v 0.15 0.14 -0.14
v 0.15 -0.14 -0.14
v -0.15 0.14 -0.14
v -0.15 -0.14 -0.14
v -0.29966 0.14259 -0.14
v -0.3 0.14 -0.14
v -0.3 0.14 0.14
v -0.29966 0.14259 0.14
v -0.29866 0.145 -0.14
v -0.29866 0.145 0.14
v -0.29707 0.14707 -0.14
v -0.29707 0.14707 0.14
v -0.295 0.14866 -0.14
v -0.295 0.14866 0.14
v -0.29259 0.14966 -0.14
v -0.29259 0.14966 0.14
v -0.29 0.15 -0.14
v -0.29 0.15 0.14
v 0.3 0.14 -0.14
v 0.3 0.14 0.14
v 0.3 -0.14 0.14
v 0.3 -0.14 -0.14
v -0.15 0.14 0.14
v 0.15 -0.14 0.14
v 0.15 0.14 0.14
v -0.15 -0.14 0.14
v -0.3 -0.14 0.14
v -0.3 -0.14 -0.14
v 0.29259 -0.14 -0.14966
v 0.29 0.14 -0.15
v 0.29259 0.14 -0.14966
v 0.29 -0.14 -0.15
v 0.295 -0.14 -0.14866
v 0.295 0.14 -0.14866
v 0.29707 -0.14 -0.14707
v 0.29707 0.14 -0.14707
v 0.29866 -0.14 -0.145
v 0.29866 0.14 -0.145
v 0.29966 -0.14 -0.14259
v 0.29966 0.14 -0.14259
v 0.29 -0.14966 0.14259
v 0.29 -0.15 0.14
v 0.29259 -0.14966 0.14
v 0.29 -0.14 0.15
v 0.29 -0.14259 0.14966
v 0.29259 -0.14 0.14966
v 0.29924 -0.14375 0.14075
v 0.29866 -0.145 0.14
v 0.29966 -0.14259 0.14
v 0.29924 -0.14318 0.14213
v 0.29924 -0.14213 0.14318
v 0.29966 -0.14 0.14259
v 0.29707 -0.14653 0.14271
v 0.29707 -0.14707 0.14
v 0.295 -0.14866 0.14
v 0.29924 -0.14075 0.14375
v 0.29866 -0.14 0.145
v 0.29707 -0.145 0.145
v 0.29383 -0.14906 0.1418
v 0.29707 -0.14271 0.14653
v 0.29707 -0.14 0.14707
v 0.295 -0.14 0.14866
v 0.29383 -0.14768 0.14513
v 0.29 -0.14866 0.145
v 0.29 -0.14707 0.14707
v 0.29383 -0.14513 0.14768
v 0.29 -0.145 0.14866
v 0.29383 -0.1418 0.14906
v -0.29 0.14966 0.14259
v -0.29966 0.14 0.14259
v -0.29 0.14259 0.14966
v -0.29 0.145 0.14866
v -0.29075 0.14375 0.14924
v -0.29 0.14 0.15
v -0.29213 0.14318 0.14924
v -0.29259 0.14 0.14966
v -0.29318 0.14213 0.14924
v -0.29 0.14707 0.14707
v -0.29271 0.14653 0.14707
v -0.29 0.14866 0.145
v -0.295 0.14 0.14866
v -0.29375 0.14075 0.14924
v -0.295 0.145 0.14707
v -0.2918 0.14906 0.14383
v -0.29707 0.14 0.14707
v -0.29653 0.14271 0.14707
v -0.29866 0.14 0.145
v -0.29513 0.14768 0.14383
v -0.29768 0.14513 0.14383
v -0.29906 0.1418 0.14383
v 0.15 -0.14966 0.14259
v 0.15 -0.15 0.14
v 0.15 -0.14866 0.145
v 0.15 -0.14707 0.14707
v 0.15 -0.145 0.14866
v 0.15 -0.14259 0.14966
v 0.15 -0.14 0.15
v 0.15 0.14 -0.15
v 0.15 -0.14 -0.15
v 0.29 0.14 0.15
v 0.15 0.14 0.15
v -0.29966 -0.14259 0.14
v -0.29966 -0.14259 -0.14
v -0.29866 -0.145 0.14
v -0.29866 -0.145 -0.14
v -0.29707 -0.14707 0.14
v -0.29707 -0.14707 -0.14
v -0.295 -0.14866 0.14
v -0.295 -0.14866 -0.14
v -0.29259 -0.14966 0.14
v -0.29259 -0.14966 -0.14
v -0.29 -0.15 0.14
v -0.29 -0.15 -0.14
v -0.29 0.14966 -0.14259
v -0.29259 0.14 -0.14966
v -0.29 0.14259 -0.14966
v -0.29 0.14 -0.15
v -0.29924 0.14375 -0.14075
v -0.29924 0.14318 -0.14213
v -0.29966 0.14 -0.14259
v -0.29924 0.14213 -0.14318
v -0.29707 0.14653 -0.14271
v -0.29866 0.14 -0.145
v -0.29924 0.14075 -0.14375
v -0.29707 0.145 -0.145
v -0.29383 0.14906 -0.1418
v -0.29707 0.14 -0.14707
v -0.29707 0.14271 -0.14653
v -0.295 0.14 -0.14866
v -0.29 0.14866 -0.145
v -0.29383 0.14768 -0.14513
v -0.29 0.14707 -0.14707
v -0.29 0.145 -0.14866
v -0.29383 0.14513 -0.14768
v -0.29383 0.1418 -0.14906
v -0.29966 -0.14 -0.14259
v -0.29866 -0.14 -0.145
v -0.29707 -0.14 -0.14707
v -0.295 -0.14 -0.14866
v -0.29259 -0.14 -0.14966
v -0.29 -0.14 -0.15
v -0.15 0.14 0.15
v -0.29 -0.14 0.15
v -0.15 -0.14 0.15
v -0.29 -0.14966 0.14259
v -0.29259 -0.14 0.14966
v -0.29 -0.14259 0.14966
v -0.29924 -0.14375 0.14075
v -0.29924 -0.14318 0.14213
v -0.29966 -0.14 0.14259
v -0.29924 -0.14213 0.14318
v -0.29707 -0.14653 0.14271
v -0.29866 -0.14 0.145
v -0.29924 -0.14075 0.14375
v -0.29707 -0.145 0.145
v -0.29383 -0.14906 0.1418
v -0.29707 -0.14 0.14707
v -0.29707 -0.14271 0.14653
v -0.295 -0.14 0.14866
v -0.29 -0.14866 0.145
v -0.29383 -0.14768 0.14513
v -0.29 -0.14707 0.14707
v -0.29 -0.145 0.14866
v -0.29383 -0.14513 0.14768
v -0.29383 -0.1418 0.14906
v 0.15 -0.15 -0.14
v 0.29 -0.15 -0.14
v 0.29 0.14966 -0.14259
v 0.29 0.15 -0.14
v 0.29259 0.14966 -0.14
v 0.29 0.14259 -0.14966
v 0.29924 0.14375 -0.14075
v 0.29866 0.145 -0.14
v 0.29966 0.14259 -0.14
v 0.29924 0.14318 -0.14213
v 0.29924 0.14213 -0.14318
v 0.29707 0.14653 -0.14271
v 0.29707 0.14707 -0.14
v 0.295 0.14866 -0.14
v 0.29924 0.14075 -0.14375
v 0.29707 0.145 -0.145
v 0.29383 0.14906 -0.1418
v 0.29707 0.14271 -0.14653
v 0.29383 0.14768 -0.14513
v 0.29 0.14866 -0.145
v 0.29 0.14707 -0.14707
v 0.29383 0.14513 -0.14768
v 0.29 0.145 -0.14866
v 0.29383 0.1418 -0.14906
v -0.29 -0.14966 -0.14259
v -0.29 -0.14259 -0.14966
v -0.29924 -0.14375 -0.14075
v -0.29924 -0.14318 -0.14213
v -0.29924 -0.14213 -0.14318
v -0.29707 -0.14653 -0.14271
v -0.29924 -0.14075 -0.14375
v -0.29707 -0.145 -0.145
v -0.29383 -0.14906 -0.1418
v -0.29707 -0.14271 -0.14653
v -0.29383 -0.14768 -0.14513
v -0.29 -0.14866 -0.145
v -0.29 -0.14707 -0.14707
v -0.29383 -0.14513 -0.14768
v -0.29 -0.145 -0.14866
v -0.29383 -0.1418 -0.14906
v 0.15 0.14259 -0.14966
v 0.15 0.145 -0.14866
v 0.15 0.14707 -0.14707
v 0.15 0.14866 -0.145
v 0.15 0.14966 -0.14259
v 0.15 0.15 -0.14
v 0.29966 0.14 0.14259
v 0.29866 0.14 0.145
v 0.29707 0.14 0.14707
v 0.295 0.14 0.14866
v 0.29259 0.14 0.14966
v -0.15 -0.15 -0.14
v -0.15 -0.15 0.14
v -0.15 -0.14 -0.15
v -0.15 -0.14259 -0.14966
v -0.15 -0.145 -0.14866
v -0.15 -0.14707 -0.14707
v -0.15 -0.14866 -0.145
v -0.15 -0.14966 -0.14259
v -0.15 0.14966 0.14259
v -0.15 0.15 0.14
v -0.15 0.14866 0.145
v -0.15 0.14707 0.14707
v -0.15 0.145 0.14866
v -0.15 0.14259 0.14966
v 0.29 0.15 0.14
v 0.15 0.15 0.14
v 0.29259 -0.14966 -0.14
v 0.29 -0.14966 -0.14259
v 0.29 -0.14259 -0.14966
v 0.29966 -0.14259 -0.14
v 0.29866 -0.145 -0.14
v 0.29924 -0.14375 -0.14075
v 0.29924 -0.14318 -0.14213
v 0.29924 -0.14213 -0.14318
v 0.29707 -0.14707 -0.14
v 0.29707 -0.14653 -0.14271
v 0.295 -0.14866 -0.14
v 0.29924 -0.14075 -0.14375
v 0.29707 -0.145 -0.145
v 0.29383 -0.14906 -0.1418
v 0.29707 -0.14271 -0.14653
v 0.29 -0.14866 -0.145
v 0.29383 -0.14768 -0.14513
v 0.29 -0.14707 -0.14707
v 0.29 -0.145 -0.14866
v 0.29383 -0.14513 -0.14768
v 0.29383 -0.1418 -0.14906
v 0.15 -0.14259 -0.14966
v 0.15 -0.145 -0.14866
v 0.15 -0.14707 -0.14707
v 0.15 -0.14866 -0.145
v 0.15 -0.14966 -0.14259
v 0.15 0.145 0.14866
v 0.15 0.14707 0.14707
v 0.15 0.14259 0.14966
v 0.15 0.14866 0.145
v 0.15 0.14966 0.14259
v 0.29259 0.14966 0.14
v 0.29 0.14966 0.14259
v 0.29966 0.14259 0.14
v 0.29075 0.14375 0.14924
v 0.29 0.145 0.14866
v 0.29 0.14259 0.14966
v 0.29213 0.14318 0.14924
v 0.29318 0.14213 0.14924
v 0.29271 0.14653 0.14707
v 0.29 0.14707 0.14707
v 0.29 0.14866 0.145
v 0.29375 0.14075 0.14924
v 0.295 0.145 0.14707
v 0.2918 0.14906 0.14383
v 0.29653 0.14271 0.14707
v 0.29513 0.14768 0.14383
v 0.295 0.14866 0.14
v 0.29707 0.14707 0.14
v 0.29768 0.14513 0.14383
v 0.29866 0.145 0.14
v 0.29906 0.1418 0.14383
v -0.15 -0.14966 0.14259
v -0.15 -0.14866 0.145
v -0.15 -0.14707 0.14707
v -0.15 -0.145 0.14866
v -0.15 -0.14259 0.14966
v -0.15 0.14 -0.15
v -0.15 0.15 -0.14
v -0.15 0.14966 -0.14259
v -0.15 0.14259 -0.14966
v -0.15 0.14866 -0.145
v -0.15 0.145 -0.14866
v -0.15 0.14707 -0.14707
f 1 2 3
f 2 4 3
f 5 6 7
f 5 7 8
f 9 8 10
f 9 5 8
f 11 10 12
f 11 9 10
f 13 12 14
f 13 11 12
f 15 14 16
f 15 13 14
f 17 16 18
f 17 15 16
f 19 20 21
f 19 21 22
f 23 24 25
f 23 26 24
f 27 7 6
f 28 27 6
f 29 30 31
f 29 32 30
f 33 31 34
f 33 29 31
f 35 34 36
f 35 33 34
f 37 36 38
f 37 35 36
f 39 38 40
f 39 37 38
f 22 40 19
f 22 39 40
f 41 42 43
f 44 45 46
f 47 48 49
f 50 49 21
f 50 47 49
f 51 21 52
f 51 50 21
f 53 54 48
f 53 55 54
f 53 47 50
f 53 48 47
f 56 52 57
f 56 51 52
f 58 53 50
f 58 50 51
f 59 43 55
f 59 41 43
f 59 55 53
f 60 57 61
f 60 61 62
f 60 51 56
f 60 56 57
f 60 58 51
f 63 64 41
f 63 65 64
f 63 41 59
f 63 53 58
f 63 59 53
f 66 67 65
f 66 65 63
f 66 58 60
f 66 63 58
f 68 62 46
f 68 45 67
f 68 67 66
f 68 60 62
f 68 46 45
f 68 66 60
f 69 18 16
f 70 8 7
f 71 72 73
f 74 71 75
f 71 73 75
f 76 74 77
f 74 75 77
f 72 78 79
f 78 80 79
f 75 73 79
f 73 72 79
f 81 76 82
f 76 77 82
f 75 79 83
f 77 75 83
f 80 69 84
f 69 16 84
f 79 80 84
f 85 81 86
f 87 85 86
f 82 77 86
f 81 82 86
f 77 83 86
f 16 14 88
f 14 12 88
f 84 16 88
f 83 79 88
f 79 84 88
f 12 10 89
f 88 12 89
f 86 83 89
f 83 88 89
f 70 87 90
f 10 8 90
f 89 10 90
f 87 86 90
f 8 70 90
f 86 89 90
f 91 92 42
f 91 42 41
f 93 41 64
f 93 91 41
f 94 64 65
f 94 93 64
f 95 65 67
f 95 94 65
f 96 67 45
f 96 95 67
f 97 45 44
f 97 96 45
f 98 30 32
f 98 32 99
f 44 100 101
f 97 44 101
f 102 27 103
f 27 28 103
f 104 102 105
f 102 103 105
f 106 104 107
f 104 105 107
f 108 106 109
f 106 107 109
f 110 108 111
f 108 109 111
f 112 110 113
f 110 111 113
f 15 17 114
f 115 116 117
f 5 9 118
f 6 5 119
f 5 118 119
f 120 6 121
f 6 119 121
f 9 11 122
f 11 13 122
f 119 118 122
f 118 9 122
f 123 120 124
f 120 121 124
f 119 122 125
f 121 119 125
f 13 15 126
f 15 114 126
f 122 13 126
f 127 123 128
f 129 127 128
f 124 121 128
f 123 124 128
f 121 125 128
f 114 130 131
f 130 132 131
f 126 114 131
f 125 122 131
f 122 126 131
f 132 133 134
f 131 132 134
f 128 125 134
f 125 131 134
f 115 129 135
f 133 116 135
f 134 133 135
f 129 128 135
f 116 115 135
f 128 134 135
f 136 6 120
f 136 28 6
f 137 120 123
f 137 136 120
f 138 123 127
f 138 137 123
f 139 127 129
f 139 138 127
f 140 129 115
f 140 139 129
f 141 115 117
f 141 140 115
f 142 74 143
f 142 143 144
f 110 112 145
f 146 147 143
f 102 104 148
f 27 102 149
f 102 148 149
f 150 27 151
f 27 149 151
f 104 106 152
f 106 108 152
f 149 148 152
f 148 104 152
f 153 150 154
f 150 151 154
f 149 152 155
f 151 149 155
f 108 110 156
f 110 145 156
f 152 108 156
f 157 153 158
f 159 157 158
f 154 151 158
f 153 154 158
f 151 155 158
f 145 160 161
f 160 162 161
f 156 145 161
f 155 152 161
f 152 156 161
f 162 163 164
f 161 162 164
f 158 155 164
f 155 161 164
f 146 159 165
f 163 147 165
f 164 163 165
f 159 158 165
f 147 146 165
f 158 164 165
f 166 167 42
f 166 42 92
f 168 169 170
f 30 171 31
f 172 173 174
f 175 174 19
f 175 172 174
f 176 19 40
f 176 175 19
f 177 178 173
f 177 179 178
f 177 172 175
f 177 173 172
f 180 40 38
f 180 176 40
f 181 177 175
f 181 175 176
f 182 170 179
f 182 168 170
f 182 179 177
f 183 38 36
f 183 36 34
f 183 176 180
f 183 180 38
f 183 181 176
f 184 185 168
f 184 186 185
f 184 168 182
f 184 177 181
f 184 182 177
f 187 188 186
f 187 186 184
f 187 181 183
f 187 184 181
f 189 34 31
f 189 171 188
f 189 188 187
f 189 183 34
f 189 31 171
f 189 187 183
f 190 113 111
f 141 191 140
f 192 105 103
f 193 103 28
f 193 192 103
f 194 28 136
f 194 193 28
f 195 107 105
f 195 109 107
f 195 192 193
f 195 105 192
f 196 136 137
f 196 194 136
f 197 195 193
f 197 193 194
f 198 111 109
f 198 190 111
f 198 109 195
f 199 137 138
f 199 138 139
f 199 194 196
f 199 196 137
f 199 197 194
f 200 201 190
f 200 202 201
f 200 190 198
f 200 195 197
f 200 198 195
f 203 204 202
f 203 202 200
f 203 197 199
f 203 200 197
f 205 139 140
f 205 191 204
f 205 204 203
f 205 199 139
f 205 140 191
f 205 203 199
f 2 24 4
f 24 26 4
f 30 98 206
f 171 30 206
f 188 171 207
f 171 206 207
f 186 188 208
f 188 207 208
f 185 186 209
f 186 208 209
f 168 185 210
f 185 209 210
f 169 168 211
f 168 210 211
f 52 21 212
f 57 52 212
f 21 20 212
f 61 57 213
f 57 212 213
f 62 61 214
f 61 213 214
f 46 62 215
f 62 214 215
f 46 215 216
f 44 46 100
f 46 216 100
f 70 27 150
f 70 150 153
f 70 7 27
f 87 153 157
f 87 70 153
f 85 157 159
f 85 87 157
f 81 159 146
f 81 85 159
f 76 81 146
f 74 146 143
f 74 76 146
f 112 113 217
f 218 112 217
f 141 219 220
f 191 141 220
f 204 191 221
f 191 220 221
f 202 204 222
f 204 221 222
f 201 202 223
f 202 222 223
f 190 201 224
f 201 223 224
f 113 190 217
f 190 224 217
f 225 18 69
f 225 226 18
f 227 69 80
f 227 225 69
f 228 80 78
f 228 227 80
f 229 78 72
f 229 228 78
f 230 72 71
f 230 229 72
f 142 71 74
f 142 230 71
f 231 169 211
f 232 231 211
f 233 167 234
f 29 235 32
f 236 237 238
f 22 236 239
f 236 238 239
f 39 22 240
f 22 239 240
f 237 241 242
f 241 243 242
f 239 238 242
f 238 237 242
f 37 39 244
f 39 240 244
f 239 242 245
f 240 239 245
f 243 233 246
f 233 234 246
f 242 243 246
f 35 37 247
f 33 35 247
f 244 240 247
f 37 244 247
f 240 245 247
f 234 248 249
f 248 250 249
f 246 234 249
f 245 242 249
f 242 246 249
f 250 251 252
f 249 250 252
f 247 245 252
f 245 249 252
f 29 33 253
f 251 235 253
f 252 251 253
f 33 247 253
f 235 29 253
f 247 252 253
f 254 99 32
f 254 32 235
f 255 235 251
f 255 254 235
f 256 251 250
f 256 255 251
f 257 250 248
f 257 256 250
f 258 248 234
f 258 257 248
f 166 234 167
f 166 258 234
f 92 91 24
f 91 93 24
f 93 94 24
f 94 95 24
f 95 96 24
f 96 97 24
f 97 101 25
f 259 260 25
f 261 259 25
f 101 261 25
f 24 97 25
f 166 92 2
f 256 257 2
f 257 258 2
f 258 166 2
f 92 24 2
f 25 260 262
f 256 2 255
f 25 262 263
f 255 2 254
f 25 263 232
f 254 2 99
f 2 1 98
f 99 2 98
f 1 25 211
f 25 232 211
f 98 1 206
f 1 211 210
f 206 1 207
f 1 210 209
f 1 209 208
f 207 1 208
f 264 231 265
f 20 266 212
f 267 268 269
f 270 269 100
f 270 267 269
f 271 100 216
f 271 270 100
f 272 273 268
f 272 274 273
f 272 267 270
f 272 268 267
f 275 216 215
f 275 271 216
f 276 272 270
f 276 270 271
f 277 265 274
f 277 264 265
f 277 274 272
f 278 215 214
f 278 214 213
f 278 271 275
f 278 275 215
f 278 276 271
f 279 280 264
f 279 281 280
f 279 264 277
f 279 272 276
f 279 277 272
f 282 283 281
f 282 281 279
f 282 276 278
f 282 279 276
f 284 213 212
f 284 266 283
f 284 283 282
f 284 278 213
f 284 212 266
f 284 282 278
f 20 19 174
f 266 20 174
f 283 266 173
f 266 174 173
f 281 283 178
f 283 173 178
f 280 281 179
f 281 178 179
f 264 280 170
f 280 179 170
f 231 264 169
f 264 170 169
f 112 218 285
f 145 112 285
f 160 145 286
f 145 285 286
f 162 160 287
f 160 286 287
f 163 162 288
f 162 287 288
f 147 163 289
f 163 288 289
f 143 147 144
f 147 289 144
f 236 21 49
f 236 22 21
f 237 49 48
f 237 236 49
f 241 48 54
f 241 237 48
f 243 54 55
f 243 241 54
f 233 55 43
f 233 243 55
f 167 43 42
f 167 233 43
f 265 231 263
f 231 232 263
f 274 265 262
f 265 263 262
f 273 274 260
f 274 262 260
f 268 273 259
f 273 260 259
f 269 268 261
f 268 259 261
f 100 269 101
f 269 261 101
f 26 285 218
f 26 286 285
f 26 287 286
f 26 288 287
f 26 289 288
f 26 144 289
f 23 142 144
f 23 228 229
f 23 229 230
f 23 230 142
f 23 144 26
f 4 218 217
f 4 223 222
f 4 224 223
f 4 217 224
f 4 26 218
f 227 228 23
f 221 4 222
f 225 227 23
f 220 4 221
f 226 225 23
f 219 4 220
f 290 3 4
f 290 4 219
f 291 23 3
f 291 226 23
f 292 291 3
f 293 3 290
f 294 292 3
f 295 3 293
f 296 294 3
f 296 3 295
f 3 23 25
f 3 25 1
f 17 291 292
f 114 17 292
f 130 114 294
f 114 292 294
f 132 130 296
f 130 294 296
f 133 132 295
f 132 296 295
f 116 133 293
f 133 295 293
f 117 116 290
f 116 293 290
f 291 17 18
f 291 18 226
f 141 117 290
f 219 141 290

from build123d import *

# Parameters (mm, degrees)
SKETCH1_W            = 0.15
SKETCH1_H            = 0.3
THICKNESS_DEPTH      = 0.15
FILLET1_R            = 0.01
SKETCH2_W            = 0.28
SKETCH2_H            = 0.28
BOSS_EXTRUDE2_DEPTH  = 0.15
FILLET1_OF_MIRROR3_R = 0.01


with BuildPart() as part:
    # Sketch1 → THICKNESS (new body, symmetric)
    with BuildSketch(Plane(origin=(0, 0, 0), x_dir=(1, 0, 0), z_dir=(0, 1, 0))):
        with Locations((-0.225, 0)):
            Rectangle(SKETCH1_W, SKETCH1_H)
    thickness = extrude(amount=THICKNESS_DEPTH, both=True)

    # Fillet1
    fillet1_edges = [part.edges().sort_by_distance(p)[0] for p in [
        (-0.225, 0.15, -0.15),
        (-0.3, 0.15, 0),
        (-0.225, -0.15, -0.15),
        (-0.225, -0.15, 0.15),
        (-0.3, -0.15, 0),
        (-0.225, 0.15, 0.15),
        (-0.3, 0, -0.15),
        (-0.3, 0, 0.15),
    ]]
    fillet(fillet1_edges, radius=FILLET1_R)

    # Sketch2 → Boss-Extrude2 (add)
    with BuildSketch(Plane(origin=(0, 0, 0), x_dir=(0, 0, -1), z_dir=(1, 0, 0))):
        Rectangle(SKETCH2_W, SKETCH2_H)
    boss_extrude2 = extrude(amount=-BOSS_EXTRUDE2_DEPTH)

    # Mirror3: THICKNESS, Boss-Extrude2 across plane
    add(thickness.mirror(Plane(origin=(0, 0, 0), x_dir=(0, 0, 1), z_dir=(1, 0, 0))))
    add(boss_extrude2.mirror(Plane(origin=(0, 0, 0), x_dir=(0, 0, 1), z_dir=(1, 0, 0))))

    # Fillet1 of Mirror3
    fillet1_of_mirror3_edges = [part.edges().sort_by_distance(p)[0] for p in [
        (0.225, 0.15, -0.15),
        (0.3, 0.15, 0),
        (0.225, -0.15, -0.15),
        (0.225, -0.15, 0.15),
        (0.3, -0.15, 0),
        (0.225, 0.15, 0.15),
        (0.3, 0, -0.15),
        (0.3, 0, 0.15),
    ]]
    fillet(fillet1_of_mirror3_edges, radius=FILLET1_OF_MIRROR3_R)


solid = part.part
